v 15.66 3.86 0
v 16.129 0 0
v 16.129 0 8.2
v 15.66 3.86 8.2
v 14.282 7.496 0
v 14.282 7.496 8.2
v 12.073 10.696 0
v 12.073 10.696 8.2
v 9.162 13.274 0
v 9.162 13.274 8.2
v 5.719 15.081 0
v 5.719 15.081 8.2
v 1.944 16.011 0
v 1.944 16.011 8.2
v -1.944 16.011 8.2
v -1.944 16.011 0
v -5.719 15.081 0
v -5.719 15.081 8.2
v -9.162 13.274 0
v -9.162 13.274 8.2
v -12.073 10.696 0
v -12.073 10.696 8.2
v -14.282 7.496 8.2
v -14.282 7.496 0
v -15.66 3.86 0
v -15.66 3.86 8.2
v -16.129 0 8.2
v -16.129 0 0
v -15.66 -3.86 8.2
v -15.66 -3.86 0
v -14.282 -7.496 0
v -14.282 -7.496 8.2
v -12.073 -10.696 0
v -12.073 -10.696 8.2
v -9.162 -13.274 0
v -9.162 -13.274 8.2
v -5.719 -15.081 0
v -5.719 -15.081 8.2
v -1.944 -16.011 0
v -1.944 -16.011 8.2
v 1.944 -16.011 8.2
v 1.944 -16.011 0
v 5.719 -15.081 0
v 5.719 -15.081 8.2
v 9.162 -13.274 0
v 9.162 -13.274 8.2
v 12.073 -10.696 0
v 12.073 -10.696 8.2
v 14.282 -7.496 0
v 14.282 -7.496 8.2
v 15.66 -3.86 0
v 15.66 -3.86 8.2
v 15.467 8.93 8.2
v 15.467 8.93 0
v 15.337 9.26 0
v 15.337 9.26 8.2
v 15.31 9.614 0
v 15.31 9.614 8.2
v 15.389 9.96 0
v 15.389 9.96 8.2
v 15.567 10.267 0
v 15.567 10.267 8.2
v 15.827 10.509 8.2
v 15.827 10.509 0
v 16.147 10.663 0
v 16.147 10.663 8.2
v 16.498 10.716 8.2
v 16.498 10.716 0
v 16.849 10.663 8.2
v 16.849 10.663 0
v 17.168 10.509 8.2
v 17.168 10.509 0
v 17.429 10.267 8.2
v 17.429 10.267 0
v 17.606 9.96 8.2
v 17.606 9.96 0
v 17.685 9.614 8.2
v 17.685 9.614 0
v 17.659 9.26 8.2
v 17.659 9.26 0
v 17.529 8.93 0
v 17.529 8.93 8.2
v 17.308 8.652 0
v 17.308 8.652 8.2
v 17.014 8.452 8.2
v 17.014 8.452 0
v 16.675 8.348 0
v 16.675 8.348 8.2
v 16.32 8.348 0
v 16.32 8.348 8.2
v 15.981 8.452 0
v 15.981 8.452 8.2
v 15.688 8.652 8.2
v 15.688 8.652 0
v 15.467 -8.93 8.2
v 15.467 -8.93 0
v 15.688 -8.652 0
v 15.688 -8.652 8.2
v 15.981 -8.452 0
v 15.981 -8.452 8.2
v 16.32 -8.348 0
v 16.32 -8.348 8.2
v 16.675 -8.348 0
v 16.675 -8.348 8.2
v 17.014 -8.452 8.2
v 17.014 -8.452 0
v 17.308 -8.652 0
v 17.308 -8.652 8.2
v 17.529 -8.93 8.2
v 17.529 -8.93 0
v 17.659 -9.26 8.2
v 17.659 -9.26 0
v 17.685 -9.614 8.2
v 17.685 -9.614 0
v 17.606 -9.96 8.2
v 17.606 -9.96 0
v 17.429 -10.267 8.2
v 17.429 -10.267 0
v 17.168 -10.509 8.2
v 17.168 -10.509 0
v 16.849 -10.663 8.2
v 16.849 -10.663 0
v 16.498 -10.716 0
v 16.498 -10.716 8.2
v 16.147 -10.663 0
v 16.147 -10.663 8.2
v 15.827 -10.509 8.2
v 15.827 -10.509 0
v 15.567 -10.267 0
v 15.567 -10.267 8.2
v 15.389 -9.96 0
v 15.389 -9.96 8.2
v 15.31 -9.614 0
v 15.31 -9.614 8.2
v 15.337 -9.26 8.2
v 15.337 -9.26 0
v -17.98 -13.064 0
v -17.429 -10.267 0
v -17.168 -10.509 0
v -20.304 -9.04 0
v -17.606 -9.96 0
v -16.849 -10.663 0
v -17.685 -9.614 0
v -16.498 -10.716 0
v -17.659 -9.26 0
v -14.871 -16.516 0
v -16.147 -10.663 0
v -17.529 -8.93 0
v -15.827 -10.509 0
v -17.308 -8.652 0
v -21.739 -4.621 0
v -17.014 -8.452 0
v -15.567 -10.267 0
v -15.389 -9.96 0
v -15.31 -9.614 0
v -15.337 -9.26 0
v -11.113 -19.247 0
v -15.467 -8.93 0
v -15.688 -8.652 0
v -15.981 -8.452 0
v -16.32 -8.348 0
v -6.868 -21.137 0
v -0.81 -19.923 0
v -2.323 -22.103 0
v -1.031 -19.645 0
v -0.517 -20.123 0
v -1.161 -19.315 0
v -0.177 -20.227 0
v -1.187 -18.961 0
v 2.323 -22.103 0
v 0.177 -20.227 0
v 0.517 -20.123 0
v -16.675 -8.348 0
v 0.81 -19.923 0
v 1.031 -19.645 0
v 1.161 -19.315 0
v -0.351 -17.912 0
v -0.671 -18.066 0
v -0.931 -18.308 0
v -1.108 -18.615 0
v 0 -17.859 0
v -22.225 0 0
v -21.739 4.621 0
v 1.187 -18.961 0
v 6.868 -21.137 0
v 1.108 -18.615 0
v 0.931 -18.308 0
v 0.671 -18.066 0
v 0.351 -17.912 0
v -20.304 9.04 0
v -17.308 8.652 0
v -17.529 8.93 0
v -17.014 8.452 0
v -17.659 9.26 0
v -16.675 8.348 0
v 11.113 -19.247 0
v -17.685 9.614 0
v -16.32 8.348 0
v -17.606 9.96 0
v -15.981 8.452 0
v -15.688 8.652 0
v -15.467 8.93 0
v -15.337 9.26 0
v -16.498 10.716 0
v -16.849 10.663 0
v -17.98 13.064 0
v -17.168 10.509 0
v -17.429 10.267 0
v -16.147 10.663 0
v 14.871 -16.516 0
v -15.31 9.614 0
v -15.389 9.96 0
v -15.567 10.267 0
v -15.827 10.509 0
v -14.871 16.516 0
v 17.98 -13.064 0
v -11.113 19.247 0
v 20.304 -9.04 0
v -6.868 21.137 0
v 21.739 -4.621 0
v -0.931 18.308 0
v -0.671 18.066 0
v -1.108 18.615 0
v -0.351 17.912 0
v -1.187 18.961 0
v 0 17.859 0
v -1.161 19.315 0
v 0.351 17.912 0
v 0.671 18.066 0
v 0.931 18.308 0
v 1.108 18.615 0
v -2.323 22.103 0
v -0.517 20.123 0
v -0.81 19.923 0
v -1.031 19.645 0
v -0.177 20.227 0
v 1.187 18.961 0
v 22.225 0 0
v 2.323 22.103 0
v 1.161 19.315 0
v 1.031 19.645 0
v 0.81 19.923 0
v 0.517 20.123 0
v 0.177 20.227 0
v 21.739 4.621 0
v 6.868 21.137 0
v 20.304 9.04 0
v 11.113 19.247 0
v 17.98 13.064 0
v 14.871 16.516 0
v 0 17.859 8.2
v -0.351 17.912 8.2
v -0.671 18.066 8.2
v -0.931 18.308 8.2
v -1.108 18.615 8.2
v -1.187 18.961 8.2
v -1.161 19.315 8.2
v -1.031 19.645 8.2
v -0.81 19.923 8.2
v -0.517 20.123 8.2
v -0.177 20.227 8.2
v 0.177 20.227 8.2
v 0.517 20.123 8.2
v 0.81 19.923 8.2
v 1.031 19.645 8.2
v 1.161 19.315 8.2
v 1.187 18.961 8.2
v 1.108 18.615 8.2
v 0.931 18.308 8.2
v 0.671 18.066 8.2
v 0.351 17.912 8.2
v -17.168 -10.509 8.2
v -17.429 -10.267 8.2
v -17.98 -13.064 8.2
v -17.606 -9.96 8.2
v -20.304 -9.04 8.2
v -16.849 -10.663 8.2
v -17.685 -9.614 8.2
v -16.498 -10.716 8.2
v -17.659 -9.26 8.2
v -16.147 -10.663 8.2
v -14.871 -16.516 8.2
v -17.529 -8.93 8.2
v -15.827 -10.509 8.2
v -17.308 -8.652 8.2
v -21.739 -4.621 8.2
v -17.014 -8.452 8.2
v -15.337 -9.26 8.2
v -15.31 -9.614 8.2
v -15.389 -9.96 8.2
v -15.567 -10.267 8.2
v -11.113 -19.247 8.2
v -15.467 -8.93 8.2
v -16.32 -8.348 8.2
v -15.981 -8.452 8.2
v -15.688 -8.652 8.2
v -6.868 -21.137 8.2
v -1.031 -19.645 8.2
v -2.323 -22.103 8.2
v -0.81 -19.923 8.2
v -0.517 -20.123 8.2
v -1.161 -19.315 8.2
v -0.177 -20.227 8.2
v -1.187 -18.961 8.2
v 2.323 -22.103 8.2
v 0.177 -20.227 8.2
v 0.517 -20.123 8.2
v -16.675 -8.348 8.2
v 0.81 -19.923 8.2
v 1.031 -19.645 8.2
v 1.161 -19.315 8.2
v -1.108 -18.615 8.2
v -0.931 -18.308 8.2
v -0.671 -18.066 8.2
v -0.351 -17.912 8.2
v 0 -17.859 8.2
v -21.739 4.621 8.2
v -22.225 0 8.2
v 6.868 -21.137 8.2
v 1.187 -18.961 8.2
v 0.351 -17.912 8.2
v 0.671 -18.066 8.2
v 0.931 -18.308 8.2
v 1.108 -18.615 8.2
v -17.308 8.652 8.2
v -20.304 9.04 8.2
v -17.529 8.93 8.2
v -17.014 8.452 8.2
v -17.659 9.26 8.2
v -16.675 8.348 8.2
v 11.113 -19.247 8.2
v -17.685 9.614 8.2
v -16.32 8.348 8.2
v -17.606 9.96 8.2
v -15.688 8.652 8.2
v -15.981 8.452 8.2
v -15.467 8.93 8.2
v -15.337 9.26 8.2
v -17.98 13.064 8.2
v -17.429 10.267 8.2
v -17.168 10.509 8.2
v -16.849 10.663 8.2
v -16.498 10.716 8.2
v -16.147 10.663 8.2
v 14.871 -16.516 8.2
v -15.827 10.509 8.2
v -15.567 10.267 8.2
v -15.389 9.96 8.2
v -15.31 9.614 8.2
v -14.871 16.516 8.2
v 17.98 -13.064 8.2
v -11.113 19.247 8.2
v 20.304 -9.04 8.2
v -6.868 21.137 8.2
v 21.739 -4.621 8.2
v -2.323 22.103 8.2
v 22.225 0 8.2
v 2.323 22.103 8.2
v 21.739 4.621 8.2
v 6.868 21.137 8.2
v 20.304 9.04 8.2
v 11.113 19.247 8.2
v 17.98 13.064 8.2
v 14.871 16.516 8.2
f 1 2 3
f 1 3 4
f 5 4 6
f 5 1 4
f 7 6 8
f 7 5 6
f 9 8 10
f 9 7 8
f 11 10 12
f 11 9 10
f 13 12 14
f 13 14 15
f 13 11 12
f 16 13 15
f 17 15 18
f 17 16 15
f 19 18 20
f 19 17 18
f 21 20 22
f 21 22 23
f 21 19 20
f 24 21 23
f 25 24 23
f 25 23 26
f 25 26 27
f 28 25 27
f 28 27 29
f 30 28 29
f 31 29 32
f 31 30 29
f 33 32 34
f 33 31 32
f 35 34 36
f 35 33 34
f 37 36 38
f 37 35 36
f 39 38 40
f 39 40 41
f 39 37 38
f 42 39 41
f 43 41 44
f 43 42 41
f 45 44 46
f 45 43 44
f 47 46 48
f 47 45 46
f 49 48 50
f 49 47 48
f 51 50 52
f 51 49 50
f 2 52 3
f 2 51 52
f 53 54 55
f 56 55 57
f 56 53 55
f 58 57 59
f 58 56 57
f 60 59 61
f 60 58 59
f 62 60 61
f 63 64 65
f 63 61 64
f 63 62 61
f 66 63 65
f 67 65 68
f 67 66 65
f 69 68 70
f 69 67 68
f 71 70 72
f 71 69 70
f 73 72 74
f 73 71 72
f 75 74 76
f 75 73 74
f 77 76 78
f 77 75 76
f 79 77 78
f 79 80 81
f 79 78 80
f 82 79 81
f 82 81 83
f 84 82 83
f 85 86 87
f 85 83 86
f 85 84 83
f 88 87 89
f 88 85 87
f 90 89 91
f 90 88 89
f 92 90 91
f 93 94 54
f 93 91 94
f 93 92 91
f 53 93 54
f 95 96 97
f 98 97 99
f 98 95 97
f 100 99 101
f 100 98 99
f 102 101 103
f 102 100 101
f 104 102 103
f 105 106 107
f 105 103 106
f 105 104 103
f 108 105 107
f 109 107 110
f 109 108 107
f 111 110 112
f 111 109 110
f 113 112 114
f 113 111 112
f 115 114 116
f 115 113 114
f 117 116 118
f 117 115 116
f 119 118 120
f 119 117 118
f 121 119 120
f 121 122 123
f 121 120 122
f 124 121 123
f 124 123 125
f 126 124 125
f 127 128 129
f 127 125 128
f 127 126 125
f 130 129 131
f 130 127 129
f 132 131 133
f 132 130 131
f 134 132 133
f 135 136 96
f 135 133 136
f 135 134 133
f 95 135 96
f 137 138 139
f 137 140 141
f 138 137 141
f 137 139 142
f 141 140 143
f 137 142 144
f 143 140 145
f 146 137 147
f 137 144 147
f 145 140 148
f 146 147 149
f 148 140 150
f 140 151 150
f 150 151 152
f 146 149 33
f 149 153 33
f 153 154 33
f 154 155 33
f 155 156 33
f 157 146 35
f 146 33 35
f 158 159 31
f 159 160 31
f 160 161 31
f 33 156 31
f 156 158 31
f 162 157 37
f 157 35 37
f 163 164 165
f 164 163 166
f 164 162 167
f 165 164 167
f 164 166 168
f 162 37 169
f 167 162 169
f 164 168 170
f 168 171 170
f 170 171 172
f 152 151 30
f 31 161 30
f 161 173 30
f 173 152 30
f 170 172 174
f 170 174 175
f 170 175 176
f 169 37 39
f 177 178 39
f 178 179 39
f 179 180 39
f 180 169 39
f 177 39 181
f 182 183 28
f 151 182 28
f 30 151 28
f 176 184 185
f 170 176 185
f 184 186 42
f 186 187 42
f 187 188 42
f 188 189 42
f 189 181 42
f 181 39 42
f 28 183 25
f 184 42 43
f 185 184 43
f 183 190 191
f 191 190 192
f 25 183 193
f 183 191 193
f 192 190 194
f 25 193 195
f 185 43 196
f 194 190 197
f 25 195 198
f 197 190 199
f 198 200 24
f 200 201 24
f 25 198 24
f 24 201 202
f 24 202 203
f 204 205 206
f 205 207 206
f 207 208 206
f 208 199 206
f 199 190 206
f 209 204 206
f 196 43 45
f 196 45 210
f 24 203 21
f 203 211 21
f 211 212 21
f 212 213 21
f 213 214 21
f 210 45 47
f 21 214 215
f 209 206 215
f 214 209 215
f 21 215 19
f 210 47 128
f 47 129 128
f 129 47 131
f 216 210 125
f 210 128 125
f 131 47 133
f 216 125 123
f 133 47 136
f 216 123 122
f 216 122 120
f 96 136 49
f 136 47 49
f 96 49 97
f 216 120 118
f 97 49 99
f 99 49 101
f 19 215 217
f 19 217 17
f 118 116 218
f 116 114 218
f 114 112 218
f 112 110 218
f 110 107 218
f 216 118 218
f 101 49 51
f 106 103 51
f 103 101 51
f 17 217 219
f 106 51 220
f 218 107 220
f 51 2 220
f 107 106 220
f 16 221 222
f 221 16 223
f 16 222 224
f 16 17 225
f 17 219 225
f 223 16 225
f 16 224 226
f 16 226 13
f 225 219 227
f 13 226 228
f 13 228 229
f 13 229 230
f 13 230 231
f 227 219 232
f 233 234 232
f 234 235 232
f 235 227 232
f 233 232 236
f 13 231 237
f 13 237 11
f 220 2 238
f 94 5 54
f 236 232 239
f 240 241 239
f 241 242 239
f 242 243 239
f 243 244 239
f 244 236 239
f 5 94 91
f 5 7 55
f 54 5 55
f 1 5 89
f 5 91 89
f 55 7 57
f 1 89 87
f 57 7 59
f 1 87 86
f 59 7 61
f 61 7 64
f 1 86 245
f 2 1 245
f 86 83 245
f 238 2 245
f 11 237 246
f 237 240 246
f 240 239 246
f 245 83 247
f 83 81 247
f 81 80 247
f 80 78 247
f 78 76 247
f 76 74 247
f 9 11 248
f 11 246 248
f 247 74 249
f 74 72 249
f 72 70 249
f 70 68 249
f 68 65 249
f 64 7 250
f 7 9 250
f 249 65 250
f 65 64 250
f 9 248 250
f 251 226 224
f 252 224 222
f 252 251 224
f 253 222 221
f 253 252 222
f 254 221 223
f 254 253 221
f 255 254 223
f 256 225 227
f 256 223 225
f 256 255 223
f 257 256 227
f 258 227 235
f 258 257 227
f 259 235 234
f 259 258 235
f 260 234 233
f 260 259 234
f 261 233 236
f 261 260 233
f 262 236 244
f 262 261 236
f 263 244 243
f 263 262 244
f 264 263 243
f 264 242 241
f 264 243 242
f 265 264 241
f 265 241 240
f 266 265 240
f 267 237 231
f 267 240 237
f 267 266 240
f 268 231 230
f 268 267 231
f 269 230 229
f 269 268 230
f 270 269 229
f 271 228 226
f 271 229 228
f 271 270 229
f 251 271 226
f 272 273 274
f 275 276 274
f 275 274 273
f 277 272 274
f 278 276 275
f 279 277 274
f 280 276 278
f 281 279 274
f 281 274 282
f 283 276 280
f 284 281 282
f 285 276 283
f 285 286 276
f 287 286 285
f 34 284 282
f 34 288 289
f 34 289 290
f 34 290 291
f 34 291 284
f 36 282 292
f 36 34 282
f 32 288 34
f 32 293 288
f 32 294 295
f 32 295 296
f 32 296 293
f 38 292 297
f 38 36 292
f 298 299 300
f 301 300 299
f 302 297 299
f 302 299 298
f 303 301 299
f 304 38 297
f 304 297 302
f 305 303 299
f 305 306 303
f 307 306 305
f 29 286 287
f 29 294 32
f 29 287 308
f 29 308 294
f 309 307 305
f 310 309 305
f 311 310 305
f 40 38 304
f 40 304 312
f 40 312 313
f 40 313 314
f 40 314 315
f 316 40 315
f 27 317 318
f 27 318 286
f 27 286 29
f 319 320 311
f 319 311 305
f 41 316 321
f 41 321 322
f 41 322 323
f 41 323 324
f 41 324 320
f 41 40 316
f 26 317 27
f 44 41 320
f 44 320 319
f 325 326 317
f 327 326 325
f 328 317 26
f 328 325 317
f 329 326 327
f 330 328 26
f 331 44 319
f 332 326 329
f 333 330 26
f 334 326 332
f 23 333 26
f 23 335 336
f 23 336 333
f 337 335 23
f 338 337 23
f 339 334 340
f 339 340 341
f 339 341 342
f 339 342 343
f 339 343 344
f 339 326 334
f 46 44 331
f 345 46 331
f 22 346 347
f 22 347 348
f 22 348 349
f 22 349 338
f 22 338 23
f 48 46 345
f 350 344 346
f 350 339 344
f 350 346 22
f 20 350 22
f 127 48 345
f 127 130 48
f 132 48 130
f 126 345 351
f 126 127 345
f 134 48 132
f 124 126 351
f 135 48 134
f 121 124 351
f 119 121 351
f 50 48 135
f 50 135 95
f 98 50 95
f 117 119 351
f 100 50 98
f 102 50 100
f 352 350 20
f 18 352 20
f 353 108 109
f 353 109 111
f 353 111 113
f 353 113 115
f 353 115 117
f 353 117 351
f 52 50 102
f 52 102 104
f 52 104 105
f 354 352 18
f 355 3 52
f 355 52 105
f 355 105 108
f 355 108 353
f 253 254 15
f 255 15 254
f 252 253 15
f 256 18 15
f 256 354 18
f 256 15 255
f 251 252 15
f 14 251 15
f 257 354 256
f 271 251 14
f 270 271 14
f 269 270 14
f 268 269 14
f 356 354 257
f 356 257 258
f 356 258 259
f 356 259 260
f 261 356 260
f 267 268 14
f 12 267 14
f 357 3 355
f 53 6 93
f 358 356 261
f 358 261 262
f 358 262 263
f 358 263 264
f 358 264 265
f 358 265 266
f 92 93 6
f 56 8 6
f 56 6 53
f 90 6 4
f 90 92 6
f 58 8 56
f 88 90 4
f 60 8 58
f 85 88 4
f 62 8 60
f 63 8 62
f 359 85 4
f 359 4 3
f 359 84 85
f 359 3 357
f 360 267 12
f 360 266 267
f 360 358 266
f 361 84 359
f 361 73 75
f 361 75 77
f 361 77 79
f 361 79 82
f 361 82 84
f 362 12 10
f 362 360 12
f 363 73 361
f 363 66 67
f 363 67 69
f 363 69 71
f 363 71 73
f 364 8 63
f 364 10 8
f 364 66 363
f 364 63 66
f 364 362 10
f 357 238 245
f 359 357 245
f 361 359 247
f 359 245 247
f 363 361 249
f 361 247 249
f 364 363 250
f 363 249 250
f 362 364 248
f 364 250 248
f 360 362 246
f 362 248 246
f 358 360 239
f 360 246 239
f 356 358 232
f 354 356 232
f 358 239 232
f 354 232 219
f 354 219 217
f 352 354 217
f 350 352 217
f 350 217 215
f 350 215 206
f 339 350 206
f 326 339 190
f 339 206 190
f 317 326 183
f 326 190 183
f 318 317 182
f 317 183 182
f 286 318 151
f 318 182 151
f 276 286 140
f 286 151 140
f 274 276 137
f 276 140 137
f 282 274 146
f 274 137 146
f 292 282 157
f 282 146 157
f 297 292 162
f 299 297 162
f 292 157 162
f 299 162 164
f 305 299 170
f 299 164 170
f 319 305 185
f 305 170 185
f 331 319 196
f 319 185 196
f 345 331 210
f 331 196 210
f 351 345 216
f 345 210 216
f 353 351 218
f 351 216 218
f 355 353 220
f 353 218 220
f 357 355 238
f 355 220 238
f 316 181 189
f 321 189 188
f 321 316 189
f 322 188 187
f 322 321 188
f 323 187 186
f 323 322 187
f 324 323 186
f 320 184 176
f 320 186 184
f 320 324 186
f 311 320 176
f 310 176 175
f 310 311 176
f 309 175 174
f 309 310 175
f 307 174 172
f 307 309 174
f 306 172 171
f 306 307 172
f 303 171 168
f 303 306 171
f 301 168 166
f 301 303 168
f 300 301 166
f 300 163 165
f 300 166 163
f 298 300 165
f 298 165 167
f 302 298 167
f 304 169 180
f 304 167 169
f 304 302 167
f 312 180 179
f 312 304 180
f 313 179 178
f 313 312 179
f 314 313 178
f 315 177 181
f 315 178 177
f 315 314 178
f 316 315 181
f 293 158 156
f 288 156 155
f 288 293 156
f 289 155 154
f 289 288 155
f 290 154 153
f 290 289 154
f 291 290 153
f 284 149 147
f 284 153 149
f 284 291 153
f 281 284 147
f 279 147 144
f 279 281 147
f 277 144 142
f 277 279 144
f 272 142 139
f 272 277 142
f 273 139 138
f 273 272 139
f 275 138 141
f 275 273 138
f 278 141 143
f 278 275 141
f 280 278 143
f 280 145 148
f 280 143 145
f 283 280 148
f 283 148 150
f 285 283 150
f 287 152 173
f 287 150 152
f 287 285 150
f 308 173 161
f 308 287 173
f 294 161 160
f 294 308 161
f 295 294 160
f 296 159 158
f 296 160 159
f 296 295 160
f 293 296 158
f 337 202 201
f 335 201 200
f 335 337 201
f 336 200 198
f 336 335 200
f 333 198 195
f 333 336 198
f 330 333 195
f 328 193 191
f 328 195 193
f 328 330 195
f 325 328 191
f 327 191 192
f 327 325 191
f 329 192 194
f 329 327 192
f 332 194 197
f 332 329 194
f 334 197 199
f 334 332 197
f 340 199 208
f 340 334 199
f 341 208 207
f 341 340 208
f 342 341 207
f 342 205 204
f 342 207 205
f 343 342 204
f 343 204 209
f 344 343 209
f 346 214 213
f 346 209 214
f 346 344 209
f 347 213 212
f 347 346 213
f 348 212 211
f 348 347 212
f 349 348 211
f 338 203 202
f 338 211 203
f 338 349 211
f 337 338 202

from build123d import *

# Parameters (mm, degrees)
SKETCH1_R           = 22.225
SKETCH1_R_2         = 16.129
BOSS_EXTRUDE1_DEPTH = 8.2
CIRPATTERN1_COUNT   = 6


with BuildPart() as part:
    # Sketch1 → Boss-Extrude1 (new body)
    with BuildSketch(Plane.XY):
        Circle(SKETCH1_R)
        Circle(SKETCH1_R_2, mode=Mode.SUBTRACT)
    extrude(amount=BOSS_EXTRUDE1_DEPTH)

    # Sketch2 → 3/32 (0.09375) Diameter Hole1 (revolve, cut)
    with BuildSketch(Plane(origin=(0, 19.05, 8.2), x_dir=(0, -1, 0), z_dir=(1, 0, 0))):
        Polygon((0, 0), (0, 26.115399675), (1.190625, 25.4), (1.190625, 0), align=None)
    f_3_32_0_09375_diameter_hole1 = revolve(axis=Axis((0, 19.05, 14.55), (0, 0, -1)), mode=Mode.SUBTRACT)

    # CirPattern1: 3/32 (0.09375) Diameter Hole1 ×6 about axis
    cirpattern1_axis = Axis((0, 0, 0), (0, 0, 1))
    for i in range(1, CIRPATTERN1_COUNT):
        add(f_3_32_0_09375_diameter_hole1.rotate(cirpattern1_axis, i * 360 / CIRPATTERN1_COUNT), mode=Mode.SUBTRACT)


solid = part.part
